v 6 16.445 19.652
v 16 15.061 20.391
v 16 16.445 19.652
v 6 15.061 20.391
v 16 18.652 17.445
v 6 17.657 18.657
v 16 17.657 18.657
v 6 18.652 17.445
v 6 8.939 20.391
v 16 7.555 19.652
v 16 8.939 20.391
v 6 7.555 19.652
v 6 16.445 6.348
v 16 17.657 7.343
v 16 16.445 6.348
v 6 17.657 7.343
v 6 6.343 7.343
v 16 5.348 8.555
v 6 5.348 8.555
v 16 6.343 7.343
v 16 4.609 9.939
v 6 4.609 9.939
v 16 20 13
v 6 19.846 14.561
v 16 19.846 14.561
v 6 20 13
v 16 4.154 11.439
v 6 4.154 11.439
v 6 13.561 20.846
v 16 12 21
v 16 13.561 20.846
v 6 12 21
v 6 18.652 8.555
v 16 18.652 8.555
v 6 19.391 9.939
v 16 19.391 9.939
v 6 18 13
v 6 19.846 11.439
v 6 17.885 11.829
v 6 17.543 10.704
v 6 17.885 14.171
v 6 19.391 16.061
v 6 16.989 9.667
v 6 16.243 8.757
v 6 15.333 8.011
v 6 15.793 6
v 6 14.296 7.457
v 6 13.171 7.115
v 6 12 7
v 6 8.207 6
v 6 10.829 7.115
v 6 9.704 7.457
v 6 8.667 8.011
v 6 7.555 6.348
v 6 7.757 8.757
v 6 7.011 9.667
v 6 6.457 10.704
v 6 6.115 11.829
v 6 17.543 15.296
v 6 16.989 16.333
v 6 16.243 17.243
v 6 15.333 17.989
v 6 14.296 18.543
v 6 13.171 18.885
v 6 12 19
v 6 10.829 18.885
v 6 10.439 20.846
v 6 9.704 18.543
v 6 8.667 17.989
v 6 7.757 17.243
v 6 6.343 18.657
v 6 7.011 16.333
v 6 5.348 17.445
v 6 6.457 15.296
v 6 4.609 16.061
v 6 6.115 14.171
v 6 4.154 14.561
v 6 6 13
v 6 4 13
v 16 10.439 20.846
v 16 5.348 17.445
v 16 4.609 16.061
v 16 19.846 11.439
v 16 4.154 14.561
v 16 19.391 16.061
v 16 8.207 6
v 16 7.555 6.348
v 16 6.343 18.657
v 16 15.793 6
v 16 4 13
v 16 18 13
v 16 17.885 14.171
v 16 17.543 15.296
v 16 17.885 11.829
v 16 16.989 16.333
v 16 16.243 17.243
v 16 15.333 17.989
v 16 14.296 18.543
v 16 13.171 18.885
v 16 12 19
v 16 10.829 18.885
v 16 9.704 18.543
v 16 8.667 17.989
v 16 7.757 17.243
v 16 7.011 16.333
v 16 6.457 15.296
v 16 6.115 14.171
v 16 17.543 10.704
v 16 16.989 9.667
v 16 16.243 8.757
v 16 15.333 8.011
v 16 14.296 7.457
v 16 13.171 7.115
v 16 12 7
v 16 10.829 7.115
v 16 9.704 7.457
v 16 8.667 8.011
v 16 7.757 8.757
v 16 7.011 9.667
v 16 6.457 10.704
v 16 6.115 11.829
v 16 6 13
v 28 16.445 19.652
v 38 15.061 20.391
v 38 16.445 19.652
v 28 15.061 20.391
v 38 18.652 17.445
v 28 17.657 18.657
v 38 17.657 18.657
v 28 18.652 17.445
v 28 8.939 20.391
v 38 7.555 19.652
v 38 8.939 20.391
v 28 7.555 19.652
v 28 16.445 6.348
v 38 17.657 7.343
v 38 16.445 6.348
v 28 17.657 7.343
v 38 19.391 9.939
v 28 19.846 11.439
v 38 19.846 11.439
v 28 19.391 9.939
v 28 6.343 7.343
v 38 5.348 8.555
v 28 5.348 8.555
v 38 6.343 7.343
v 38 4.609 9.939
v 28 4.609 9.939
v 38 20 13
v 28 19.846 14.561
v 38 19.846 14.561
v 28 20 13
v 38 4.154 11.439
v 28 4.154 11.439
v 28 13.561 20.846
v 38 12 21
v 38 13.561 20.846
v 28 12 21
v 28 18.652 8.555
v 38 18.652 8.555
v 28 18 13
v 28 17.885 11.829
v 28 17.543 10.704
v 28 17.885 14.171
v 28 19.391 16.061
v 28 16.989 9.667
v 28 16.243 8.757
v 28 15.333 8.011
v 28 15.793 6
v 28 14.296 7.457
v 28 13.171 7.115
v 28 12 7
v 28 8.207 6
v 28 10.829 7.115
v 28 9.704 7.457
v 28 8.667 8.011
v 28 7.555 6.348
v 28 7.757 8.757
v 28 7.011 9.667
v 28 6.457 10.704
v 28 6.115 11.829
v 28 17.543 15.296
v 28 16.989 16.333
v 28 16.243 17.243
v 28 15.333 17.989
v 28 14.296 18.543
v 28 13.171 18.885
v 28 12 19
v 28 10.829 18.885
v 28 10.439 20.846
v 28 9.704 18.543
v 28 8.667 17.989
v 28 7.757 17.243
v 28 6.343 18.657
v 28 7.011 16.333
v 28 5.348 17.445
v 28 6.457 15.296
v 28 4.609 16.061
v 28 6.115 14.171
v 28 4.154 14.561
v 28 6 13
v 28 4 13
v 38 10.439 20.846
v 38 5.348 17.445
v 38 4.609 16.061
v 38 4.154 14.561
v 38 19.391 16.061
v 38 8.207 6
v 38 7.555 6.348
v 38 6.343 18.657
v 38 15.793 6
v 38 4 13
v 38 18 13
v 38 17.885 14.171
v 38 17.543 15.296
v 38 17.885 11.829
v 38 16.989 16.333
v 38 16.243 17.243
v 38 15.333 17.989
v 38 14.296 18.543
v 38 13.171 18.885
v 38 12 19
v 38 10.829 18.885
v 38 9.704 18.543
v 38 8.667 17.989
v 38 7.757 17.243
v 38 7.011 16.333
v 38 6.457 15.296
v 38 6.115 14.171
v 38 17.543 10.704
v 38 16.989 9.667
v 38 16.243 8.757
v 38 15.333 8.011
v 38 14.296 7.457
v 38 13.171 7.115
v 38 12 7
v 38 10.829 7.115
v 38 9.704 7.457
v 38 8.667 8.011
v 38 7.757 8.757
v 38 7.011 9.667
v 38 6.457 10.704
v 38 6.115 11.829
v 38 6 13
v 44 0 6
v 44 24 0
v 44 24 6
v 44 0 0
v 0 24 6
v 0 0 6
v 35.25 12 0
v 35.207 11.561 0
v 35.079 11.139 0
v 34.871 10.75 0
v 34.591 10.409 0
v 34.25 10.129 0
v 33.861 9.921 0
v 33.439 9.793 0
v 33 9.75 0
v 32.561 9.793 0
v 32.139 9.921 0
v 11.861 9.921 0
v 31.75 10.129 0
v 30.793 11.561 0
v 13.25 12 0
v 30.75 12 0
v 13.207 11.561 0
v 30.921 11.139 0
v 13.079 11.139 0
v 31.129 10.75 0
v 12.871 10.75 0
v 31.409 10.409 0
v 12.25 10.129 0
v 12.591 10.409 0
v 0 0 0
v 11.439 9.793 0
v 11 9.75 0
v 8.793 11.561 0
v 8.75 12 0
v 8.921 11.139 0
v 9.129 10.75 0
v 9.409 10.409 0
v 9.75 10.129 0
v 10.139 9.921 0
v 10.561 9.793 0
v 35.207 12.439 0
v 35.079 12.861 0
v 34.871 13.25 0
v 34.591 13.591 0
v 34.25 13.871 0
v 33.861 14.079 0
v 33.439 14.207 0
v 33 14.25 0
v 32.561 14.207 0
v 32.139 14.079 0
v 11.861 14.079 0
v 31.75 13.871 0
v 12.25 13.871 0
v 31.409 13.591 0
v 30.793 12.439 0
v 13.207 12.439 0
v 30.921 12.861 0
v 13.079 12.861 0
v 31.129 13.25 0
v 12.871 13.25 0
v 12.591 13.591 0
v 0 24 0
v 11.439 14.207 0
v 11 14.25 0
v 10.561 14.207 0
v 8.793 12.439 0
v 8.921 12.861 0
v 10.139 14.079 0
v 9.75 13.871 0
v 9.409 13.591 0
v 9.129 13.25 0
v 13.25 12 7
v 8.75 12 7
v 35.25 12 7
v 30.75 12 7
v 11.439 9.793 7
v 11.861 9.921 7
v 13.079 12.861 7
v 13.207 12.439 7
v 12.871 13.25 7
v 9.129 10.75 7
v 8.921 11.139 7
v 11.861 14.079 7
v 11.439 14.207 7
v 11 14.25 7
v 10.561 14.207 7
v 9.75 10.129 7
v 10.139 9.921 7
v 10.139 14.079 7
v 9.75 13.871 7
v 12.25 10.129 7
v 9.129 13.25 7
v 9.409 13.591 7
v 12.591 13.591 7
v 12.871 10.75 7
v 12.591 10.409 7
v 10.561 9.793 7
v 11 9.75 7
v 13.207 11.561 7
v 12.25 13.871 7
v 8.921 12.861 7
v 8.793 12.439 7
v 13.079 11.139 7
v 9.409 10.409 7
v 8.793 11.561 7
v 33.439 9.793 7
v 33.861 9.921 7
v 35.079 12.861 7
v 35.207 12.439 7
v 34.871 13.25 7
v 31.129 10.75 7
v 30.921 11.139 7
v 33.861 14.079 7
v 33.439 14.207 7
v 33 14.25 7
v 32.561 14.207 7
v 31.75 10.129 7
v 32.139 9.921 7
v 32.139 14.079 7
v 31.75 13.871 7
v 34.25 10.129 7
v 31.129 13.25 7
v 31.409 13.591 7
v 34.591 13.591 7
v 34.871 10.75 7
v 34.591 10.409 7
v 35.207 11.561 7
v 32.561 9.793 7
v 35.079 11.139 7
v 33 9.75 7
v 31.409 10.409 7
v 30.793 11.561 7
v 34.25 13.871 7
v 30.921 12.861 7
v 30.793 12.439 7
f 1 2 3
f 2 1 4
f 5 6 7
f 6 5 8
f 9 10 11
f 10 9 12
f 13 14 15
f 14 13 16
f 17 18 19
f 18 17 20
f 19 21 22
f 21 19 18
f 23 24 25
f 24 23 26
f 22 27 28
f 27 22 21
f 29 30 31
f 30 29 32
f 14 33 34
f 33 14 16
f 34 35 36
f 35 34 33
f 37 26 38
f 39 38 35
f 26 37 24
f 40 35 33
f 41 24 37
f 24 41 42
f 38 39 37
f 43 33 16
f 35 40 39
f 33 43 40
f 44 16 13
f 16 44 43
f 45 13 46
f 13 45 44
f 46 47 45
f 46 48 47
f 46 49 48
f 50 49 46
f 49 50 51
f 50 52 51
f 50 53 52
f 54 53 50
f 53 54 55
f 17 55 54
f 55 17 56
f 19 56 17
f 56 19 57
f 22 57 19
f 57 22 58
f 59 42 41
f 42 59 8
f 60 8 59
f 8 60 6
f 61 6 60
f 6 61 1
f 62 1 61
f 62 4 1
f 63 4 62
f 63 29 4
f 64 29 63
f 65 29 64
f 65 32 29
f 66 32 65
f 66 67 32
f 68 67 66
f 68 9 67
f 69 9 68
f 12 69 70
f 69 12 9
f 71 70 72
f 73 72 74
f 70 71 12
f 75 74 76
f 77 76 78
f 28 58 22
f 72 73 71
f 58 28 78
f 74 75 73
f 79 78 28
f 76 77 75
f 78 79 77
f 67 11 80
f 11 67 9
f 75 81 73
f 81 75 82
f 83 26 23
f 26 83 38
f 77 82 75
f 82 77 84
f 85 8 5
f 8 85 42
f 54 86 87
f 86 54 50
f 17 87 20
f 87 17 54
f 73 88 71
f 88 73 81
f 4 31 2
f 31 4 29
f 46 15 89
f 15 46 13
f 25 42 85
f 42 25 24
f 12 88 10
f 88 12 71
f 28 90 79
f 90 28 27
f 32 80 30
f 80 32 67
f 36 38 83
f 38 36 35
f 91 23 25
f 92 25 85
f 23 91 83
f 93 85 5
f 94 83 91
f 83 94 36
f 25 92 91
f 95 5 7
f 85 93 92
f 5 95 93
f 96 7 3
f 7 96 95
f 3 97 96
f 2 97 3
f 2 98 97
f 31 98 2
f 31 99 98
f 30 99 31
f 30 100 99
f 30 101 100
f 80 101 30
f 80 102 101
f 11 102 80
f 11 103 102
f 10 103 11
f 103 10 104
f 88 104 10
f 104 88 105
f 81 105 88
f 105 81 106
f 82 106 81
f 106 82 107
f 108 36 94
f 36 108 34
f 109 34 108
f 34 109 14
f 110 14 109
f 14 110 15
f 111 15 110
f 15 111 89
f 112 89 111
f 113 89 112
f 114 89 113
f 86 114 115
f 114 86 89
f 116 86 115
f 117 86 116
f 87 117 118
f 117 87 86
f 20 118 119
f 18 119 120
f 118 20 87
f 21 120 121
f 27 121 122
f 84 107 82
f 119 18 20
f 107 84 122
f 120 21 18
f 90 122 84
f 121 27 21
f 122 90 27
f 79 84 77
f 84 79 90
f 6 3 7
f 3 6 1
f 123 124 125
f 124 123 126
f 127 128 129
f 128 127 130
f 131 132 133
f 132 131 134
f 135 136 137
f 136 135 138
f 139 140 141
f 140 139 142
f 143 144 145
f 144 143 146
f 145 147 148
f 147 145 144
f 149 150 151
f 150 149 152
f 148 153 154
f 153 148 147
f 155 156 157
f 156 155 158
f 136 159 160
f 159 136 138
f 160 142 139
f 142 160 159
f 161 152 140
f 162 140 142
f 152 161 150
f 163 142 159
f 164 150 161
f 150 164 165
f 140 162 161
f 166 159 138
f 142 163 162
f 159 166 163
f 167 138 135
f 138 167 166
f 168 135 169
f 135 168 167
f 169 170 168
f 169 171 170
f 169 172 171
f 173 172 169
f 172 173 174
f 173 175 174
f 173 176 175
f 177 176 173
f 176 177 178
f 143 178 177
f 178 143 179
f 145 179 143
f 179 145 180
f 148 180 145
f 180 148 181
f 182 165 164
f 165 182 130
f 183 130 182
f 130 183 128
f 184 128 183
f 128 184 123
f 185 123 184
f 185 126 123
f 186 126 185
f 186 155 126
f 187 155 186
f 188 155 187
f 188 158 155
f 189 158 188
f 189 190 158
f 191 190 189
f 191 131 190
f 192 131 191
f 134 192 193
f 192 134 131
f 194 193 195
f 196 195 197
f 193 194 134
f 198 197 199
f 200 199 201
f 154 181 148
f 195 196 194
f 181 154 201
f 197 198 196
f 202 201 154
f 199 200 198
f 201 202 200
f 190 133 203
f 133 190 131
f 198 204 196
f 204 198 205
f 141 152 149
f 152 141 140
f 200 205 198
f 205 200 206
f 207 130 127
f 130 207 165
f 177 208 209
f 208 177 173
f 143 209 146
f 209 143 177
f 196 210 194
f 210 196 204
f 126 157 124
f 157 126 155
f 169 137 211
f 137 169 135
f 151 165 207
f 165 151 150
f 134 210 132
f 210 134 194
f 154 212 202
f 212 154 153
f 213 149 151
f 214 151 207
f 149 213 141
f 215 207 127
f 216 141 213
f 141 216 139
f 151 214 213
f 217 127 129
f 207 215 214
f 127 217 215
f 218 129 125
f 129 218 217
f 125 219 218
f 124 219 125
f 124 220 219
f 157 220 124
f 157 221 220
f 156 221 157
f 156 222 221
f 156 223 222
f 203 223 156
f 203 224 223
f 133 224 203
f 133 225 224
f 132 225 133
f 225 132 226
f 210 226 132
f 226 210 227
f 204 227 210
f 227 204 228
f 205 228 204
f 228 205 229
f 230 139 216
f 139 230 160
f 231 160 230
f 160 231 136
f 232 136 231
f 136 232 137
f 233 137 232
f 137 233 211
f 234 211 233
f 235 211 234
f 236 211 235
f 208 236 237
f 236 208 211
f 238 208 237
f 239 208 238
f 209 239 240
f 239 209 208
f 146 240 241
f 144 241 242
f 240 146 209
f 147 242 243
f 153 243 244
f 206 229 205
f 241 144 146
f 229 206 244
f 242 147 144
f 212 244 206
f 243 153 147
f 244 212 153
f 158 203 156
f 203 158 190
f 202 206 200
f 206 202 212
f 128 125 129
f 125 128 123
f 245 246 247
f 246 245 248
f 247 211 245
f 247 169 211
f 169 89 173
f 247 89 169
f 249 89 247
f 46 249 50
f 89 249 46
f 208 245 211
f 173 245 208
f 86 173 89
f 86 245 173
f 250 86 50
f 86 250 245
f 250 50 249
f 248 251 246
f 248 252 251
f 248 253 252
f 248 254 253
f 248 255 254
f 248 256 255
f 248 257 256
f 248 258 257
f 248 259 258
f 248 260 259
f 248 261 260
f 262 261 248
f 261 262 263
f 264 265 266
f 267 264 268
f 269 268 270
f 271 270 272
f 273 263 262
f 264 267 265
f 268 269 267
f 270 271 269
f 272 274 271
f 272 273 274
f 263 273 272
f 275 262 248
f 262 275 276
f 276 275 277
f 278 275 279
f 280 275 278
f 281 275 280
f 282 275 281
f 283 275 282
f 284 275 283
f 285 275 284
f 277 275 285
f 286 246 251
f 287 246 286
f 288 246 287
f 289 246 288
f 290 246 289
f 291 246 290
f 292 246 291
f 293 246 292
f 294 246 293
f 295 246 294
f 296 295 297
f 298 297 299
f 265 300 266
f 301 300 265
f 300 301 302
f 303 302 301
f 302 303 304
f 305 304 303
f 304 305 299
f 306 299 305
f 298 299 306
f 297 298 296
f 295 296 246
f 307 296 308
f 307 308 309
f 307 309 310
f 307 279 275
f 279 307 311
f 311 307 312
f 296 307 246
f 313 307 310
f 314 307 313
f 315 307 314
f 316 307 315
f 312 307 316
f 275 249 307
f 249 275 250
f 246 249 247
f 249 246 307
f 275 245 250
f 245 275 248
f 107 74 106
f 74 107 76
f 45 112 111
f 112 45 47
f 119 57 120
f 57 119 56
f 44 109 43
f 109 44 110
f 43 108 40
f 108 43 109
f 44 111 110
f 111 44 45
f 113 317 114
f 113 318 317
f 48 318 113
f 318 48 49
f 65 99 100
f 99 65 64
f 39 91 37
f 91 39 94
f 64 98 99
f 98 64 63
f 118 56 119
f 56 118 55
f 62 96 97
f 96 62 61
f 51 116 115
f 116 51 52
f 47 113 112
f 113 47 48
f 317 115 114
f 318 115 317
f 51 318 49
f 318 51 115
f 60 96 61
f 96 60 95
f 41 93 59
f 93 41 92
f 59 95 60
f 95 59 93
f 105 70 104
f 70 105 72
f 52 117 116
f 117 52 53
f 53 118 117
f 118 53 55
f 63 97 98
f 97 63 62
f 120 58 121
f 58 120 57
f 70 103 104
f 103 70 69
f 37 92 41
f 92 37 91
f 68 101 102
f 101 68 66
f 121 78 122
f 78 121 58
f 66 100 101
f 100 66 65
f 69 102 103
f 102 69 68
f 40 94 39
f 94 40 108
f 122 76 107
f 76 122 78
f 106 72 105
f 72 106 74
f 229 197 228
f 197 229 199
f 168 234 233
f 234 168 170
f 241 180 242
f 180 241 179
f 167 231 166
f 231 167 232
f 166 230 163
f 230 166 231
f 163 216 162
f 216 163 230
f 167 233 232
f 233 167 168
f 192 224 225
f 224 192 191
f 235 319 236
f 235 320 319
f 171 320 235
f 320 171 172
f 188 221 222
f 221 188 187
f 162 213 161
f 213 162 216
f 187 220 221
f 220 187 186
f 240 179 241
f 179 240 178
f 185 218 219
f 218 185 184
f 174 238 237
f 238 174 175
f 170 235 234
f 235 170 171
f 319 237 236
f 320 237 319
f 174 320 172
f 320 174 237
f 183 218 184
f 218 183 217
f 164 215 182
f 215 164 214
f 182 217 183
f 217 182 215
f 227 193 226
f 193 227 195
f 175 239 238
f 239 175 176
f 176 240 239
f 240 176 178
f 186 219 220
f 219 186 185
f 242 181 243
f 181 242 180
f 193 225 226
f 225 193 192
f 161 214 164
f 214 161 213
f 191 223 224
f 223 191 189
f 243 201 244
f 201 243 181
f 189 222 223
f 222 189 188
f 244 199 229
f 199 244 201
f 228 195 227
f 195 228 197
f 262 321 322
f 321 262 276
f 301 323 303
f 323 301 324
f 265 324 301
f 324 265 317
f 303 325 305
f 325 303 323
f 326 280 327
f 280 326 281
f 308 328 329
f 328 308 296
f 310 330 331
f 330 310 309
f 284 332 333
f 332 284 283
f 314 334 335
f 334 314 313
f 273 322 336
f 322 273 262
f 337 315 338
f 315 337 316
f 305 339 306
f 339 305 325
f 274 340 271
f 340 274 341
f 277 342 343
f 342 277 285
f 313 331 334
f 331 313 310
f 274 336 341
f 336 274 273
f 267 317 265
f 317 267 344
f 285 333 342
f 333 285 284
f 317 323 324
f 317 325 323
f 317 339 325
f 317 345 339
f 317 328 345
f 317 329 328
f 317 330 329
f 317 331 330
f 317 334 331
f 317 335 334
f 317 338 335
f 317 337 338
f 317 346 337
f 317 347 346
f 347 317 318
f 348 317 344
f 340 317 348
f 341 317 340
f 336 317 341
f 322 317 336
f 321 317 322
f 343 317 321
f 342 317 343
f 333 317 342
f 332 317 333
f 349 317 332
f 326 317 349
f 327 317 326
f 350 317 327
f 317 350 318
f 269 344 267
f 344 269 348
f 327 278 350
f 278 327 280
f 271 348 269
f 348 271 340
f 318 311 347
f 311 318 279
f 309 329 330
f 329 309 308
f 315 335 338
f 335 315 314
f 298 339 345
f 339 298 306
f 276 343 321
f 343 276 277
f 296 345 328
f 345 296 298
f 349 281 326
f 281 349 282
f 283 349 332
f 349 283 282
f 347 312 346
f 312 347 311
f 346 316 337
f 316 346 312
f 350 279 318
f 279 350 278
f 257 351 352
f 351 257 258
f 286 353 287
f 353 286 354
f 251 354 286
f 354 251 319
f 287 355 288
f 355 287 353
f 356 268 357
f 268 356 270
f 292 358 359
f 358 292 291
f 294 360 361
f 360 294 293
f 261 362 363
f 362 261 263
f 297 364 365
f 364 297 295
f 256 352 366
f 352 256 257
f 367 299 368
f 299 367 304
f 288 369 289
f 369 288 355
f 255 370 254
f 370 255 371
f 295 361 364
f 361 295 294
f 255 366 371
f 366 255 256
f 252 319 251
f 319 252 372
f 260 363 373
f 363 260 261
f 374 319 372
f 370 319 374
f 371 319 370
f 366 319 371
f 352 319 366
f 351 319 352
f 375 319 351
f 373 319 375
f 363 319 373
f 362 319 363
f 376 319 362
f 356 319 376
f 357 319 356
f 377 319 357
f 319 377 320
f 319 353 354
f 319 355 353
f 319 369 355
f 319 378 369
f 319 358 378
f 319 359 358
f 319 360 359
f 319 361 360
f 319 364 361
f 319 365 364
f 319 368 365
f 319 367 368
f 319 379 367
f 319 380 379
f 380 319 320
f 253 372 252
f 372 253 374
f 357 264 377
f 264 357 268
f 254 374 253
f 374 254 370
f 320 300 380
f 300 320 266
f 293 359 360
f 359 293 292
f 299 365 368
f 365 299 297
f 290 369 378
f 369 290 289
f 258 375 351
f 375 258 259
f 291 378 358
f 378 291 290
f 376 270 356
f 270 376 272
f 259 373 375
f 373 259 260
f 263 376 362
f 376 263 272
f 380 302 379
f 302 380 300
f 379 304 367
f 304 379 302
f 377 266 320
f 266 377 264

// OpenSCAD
$fn = 32;

// ----------------------------------------------------------------------
// Cable clip: cable 12 mm, clamp 16 mm, base 44 mm
// ----------------------------------------------------------------------

// --- parameters (mm) ---
foot_w = 44;              // base length, X
foot_d = 24;              // base width, Y
foot_t = 6;               // base thickness
hose_seat_d = 16;         // clamp outside diameter
ring_t = 2;               // clamp wall
cable_d = 12;             // cable opening
ring_w = 10;              // clamp width along the cable
screw_d = 4.5;            // screw clearance
sink = 1;                 // overlap of the clamp into the base
pitch = 22;               // distance between the two clamps

module base() {
  cube([foot_w, foot_d, foot_t]);
}

module clamps() {
  for (sx = [-1, 1])
    translate([foot_w / 2 + sx * pitch / 2, foot_d / 2, foot_t + hose_seat_d / 2 - sink]) rotate([0, 90, 0])
      cylinder(h = ring_w, d = hose_seat_d, center = true);
}

difference() {
  union() {
    base();
    clamps();
  }
  for (sx = [-1, 1])
    translate([foot_w / 2 + sx * pitch / 2, foot_d / 2, foot_t + hose_seat_d / 2 - sink]) rotate([0, 90, 0]) translate([0, 0, -ring_w / 2 - 1]) cylinder(h = ring_w + 2, d = cable_d);
  translate([11, foot_d / 2, -1]) cylinder(h = foot_t + 2, d = screw_d);
  translate([33, foot_d / 2, -1]) cylinder(h = foot_t + 2, d = screw_d);
}
